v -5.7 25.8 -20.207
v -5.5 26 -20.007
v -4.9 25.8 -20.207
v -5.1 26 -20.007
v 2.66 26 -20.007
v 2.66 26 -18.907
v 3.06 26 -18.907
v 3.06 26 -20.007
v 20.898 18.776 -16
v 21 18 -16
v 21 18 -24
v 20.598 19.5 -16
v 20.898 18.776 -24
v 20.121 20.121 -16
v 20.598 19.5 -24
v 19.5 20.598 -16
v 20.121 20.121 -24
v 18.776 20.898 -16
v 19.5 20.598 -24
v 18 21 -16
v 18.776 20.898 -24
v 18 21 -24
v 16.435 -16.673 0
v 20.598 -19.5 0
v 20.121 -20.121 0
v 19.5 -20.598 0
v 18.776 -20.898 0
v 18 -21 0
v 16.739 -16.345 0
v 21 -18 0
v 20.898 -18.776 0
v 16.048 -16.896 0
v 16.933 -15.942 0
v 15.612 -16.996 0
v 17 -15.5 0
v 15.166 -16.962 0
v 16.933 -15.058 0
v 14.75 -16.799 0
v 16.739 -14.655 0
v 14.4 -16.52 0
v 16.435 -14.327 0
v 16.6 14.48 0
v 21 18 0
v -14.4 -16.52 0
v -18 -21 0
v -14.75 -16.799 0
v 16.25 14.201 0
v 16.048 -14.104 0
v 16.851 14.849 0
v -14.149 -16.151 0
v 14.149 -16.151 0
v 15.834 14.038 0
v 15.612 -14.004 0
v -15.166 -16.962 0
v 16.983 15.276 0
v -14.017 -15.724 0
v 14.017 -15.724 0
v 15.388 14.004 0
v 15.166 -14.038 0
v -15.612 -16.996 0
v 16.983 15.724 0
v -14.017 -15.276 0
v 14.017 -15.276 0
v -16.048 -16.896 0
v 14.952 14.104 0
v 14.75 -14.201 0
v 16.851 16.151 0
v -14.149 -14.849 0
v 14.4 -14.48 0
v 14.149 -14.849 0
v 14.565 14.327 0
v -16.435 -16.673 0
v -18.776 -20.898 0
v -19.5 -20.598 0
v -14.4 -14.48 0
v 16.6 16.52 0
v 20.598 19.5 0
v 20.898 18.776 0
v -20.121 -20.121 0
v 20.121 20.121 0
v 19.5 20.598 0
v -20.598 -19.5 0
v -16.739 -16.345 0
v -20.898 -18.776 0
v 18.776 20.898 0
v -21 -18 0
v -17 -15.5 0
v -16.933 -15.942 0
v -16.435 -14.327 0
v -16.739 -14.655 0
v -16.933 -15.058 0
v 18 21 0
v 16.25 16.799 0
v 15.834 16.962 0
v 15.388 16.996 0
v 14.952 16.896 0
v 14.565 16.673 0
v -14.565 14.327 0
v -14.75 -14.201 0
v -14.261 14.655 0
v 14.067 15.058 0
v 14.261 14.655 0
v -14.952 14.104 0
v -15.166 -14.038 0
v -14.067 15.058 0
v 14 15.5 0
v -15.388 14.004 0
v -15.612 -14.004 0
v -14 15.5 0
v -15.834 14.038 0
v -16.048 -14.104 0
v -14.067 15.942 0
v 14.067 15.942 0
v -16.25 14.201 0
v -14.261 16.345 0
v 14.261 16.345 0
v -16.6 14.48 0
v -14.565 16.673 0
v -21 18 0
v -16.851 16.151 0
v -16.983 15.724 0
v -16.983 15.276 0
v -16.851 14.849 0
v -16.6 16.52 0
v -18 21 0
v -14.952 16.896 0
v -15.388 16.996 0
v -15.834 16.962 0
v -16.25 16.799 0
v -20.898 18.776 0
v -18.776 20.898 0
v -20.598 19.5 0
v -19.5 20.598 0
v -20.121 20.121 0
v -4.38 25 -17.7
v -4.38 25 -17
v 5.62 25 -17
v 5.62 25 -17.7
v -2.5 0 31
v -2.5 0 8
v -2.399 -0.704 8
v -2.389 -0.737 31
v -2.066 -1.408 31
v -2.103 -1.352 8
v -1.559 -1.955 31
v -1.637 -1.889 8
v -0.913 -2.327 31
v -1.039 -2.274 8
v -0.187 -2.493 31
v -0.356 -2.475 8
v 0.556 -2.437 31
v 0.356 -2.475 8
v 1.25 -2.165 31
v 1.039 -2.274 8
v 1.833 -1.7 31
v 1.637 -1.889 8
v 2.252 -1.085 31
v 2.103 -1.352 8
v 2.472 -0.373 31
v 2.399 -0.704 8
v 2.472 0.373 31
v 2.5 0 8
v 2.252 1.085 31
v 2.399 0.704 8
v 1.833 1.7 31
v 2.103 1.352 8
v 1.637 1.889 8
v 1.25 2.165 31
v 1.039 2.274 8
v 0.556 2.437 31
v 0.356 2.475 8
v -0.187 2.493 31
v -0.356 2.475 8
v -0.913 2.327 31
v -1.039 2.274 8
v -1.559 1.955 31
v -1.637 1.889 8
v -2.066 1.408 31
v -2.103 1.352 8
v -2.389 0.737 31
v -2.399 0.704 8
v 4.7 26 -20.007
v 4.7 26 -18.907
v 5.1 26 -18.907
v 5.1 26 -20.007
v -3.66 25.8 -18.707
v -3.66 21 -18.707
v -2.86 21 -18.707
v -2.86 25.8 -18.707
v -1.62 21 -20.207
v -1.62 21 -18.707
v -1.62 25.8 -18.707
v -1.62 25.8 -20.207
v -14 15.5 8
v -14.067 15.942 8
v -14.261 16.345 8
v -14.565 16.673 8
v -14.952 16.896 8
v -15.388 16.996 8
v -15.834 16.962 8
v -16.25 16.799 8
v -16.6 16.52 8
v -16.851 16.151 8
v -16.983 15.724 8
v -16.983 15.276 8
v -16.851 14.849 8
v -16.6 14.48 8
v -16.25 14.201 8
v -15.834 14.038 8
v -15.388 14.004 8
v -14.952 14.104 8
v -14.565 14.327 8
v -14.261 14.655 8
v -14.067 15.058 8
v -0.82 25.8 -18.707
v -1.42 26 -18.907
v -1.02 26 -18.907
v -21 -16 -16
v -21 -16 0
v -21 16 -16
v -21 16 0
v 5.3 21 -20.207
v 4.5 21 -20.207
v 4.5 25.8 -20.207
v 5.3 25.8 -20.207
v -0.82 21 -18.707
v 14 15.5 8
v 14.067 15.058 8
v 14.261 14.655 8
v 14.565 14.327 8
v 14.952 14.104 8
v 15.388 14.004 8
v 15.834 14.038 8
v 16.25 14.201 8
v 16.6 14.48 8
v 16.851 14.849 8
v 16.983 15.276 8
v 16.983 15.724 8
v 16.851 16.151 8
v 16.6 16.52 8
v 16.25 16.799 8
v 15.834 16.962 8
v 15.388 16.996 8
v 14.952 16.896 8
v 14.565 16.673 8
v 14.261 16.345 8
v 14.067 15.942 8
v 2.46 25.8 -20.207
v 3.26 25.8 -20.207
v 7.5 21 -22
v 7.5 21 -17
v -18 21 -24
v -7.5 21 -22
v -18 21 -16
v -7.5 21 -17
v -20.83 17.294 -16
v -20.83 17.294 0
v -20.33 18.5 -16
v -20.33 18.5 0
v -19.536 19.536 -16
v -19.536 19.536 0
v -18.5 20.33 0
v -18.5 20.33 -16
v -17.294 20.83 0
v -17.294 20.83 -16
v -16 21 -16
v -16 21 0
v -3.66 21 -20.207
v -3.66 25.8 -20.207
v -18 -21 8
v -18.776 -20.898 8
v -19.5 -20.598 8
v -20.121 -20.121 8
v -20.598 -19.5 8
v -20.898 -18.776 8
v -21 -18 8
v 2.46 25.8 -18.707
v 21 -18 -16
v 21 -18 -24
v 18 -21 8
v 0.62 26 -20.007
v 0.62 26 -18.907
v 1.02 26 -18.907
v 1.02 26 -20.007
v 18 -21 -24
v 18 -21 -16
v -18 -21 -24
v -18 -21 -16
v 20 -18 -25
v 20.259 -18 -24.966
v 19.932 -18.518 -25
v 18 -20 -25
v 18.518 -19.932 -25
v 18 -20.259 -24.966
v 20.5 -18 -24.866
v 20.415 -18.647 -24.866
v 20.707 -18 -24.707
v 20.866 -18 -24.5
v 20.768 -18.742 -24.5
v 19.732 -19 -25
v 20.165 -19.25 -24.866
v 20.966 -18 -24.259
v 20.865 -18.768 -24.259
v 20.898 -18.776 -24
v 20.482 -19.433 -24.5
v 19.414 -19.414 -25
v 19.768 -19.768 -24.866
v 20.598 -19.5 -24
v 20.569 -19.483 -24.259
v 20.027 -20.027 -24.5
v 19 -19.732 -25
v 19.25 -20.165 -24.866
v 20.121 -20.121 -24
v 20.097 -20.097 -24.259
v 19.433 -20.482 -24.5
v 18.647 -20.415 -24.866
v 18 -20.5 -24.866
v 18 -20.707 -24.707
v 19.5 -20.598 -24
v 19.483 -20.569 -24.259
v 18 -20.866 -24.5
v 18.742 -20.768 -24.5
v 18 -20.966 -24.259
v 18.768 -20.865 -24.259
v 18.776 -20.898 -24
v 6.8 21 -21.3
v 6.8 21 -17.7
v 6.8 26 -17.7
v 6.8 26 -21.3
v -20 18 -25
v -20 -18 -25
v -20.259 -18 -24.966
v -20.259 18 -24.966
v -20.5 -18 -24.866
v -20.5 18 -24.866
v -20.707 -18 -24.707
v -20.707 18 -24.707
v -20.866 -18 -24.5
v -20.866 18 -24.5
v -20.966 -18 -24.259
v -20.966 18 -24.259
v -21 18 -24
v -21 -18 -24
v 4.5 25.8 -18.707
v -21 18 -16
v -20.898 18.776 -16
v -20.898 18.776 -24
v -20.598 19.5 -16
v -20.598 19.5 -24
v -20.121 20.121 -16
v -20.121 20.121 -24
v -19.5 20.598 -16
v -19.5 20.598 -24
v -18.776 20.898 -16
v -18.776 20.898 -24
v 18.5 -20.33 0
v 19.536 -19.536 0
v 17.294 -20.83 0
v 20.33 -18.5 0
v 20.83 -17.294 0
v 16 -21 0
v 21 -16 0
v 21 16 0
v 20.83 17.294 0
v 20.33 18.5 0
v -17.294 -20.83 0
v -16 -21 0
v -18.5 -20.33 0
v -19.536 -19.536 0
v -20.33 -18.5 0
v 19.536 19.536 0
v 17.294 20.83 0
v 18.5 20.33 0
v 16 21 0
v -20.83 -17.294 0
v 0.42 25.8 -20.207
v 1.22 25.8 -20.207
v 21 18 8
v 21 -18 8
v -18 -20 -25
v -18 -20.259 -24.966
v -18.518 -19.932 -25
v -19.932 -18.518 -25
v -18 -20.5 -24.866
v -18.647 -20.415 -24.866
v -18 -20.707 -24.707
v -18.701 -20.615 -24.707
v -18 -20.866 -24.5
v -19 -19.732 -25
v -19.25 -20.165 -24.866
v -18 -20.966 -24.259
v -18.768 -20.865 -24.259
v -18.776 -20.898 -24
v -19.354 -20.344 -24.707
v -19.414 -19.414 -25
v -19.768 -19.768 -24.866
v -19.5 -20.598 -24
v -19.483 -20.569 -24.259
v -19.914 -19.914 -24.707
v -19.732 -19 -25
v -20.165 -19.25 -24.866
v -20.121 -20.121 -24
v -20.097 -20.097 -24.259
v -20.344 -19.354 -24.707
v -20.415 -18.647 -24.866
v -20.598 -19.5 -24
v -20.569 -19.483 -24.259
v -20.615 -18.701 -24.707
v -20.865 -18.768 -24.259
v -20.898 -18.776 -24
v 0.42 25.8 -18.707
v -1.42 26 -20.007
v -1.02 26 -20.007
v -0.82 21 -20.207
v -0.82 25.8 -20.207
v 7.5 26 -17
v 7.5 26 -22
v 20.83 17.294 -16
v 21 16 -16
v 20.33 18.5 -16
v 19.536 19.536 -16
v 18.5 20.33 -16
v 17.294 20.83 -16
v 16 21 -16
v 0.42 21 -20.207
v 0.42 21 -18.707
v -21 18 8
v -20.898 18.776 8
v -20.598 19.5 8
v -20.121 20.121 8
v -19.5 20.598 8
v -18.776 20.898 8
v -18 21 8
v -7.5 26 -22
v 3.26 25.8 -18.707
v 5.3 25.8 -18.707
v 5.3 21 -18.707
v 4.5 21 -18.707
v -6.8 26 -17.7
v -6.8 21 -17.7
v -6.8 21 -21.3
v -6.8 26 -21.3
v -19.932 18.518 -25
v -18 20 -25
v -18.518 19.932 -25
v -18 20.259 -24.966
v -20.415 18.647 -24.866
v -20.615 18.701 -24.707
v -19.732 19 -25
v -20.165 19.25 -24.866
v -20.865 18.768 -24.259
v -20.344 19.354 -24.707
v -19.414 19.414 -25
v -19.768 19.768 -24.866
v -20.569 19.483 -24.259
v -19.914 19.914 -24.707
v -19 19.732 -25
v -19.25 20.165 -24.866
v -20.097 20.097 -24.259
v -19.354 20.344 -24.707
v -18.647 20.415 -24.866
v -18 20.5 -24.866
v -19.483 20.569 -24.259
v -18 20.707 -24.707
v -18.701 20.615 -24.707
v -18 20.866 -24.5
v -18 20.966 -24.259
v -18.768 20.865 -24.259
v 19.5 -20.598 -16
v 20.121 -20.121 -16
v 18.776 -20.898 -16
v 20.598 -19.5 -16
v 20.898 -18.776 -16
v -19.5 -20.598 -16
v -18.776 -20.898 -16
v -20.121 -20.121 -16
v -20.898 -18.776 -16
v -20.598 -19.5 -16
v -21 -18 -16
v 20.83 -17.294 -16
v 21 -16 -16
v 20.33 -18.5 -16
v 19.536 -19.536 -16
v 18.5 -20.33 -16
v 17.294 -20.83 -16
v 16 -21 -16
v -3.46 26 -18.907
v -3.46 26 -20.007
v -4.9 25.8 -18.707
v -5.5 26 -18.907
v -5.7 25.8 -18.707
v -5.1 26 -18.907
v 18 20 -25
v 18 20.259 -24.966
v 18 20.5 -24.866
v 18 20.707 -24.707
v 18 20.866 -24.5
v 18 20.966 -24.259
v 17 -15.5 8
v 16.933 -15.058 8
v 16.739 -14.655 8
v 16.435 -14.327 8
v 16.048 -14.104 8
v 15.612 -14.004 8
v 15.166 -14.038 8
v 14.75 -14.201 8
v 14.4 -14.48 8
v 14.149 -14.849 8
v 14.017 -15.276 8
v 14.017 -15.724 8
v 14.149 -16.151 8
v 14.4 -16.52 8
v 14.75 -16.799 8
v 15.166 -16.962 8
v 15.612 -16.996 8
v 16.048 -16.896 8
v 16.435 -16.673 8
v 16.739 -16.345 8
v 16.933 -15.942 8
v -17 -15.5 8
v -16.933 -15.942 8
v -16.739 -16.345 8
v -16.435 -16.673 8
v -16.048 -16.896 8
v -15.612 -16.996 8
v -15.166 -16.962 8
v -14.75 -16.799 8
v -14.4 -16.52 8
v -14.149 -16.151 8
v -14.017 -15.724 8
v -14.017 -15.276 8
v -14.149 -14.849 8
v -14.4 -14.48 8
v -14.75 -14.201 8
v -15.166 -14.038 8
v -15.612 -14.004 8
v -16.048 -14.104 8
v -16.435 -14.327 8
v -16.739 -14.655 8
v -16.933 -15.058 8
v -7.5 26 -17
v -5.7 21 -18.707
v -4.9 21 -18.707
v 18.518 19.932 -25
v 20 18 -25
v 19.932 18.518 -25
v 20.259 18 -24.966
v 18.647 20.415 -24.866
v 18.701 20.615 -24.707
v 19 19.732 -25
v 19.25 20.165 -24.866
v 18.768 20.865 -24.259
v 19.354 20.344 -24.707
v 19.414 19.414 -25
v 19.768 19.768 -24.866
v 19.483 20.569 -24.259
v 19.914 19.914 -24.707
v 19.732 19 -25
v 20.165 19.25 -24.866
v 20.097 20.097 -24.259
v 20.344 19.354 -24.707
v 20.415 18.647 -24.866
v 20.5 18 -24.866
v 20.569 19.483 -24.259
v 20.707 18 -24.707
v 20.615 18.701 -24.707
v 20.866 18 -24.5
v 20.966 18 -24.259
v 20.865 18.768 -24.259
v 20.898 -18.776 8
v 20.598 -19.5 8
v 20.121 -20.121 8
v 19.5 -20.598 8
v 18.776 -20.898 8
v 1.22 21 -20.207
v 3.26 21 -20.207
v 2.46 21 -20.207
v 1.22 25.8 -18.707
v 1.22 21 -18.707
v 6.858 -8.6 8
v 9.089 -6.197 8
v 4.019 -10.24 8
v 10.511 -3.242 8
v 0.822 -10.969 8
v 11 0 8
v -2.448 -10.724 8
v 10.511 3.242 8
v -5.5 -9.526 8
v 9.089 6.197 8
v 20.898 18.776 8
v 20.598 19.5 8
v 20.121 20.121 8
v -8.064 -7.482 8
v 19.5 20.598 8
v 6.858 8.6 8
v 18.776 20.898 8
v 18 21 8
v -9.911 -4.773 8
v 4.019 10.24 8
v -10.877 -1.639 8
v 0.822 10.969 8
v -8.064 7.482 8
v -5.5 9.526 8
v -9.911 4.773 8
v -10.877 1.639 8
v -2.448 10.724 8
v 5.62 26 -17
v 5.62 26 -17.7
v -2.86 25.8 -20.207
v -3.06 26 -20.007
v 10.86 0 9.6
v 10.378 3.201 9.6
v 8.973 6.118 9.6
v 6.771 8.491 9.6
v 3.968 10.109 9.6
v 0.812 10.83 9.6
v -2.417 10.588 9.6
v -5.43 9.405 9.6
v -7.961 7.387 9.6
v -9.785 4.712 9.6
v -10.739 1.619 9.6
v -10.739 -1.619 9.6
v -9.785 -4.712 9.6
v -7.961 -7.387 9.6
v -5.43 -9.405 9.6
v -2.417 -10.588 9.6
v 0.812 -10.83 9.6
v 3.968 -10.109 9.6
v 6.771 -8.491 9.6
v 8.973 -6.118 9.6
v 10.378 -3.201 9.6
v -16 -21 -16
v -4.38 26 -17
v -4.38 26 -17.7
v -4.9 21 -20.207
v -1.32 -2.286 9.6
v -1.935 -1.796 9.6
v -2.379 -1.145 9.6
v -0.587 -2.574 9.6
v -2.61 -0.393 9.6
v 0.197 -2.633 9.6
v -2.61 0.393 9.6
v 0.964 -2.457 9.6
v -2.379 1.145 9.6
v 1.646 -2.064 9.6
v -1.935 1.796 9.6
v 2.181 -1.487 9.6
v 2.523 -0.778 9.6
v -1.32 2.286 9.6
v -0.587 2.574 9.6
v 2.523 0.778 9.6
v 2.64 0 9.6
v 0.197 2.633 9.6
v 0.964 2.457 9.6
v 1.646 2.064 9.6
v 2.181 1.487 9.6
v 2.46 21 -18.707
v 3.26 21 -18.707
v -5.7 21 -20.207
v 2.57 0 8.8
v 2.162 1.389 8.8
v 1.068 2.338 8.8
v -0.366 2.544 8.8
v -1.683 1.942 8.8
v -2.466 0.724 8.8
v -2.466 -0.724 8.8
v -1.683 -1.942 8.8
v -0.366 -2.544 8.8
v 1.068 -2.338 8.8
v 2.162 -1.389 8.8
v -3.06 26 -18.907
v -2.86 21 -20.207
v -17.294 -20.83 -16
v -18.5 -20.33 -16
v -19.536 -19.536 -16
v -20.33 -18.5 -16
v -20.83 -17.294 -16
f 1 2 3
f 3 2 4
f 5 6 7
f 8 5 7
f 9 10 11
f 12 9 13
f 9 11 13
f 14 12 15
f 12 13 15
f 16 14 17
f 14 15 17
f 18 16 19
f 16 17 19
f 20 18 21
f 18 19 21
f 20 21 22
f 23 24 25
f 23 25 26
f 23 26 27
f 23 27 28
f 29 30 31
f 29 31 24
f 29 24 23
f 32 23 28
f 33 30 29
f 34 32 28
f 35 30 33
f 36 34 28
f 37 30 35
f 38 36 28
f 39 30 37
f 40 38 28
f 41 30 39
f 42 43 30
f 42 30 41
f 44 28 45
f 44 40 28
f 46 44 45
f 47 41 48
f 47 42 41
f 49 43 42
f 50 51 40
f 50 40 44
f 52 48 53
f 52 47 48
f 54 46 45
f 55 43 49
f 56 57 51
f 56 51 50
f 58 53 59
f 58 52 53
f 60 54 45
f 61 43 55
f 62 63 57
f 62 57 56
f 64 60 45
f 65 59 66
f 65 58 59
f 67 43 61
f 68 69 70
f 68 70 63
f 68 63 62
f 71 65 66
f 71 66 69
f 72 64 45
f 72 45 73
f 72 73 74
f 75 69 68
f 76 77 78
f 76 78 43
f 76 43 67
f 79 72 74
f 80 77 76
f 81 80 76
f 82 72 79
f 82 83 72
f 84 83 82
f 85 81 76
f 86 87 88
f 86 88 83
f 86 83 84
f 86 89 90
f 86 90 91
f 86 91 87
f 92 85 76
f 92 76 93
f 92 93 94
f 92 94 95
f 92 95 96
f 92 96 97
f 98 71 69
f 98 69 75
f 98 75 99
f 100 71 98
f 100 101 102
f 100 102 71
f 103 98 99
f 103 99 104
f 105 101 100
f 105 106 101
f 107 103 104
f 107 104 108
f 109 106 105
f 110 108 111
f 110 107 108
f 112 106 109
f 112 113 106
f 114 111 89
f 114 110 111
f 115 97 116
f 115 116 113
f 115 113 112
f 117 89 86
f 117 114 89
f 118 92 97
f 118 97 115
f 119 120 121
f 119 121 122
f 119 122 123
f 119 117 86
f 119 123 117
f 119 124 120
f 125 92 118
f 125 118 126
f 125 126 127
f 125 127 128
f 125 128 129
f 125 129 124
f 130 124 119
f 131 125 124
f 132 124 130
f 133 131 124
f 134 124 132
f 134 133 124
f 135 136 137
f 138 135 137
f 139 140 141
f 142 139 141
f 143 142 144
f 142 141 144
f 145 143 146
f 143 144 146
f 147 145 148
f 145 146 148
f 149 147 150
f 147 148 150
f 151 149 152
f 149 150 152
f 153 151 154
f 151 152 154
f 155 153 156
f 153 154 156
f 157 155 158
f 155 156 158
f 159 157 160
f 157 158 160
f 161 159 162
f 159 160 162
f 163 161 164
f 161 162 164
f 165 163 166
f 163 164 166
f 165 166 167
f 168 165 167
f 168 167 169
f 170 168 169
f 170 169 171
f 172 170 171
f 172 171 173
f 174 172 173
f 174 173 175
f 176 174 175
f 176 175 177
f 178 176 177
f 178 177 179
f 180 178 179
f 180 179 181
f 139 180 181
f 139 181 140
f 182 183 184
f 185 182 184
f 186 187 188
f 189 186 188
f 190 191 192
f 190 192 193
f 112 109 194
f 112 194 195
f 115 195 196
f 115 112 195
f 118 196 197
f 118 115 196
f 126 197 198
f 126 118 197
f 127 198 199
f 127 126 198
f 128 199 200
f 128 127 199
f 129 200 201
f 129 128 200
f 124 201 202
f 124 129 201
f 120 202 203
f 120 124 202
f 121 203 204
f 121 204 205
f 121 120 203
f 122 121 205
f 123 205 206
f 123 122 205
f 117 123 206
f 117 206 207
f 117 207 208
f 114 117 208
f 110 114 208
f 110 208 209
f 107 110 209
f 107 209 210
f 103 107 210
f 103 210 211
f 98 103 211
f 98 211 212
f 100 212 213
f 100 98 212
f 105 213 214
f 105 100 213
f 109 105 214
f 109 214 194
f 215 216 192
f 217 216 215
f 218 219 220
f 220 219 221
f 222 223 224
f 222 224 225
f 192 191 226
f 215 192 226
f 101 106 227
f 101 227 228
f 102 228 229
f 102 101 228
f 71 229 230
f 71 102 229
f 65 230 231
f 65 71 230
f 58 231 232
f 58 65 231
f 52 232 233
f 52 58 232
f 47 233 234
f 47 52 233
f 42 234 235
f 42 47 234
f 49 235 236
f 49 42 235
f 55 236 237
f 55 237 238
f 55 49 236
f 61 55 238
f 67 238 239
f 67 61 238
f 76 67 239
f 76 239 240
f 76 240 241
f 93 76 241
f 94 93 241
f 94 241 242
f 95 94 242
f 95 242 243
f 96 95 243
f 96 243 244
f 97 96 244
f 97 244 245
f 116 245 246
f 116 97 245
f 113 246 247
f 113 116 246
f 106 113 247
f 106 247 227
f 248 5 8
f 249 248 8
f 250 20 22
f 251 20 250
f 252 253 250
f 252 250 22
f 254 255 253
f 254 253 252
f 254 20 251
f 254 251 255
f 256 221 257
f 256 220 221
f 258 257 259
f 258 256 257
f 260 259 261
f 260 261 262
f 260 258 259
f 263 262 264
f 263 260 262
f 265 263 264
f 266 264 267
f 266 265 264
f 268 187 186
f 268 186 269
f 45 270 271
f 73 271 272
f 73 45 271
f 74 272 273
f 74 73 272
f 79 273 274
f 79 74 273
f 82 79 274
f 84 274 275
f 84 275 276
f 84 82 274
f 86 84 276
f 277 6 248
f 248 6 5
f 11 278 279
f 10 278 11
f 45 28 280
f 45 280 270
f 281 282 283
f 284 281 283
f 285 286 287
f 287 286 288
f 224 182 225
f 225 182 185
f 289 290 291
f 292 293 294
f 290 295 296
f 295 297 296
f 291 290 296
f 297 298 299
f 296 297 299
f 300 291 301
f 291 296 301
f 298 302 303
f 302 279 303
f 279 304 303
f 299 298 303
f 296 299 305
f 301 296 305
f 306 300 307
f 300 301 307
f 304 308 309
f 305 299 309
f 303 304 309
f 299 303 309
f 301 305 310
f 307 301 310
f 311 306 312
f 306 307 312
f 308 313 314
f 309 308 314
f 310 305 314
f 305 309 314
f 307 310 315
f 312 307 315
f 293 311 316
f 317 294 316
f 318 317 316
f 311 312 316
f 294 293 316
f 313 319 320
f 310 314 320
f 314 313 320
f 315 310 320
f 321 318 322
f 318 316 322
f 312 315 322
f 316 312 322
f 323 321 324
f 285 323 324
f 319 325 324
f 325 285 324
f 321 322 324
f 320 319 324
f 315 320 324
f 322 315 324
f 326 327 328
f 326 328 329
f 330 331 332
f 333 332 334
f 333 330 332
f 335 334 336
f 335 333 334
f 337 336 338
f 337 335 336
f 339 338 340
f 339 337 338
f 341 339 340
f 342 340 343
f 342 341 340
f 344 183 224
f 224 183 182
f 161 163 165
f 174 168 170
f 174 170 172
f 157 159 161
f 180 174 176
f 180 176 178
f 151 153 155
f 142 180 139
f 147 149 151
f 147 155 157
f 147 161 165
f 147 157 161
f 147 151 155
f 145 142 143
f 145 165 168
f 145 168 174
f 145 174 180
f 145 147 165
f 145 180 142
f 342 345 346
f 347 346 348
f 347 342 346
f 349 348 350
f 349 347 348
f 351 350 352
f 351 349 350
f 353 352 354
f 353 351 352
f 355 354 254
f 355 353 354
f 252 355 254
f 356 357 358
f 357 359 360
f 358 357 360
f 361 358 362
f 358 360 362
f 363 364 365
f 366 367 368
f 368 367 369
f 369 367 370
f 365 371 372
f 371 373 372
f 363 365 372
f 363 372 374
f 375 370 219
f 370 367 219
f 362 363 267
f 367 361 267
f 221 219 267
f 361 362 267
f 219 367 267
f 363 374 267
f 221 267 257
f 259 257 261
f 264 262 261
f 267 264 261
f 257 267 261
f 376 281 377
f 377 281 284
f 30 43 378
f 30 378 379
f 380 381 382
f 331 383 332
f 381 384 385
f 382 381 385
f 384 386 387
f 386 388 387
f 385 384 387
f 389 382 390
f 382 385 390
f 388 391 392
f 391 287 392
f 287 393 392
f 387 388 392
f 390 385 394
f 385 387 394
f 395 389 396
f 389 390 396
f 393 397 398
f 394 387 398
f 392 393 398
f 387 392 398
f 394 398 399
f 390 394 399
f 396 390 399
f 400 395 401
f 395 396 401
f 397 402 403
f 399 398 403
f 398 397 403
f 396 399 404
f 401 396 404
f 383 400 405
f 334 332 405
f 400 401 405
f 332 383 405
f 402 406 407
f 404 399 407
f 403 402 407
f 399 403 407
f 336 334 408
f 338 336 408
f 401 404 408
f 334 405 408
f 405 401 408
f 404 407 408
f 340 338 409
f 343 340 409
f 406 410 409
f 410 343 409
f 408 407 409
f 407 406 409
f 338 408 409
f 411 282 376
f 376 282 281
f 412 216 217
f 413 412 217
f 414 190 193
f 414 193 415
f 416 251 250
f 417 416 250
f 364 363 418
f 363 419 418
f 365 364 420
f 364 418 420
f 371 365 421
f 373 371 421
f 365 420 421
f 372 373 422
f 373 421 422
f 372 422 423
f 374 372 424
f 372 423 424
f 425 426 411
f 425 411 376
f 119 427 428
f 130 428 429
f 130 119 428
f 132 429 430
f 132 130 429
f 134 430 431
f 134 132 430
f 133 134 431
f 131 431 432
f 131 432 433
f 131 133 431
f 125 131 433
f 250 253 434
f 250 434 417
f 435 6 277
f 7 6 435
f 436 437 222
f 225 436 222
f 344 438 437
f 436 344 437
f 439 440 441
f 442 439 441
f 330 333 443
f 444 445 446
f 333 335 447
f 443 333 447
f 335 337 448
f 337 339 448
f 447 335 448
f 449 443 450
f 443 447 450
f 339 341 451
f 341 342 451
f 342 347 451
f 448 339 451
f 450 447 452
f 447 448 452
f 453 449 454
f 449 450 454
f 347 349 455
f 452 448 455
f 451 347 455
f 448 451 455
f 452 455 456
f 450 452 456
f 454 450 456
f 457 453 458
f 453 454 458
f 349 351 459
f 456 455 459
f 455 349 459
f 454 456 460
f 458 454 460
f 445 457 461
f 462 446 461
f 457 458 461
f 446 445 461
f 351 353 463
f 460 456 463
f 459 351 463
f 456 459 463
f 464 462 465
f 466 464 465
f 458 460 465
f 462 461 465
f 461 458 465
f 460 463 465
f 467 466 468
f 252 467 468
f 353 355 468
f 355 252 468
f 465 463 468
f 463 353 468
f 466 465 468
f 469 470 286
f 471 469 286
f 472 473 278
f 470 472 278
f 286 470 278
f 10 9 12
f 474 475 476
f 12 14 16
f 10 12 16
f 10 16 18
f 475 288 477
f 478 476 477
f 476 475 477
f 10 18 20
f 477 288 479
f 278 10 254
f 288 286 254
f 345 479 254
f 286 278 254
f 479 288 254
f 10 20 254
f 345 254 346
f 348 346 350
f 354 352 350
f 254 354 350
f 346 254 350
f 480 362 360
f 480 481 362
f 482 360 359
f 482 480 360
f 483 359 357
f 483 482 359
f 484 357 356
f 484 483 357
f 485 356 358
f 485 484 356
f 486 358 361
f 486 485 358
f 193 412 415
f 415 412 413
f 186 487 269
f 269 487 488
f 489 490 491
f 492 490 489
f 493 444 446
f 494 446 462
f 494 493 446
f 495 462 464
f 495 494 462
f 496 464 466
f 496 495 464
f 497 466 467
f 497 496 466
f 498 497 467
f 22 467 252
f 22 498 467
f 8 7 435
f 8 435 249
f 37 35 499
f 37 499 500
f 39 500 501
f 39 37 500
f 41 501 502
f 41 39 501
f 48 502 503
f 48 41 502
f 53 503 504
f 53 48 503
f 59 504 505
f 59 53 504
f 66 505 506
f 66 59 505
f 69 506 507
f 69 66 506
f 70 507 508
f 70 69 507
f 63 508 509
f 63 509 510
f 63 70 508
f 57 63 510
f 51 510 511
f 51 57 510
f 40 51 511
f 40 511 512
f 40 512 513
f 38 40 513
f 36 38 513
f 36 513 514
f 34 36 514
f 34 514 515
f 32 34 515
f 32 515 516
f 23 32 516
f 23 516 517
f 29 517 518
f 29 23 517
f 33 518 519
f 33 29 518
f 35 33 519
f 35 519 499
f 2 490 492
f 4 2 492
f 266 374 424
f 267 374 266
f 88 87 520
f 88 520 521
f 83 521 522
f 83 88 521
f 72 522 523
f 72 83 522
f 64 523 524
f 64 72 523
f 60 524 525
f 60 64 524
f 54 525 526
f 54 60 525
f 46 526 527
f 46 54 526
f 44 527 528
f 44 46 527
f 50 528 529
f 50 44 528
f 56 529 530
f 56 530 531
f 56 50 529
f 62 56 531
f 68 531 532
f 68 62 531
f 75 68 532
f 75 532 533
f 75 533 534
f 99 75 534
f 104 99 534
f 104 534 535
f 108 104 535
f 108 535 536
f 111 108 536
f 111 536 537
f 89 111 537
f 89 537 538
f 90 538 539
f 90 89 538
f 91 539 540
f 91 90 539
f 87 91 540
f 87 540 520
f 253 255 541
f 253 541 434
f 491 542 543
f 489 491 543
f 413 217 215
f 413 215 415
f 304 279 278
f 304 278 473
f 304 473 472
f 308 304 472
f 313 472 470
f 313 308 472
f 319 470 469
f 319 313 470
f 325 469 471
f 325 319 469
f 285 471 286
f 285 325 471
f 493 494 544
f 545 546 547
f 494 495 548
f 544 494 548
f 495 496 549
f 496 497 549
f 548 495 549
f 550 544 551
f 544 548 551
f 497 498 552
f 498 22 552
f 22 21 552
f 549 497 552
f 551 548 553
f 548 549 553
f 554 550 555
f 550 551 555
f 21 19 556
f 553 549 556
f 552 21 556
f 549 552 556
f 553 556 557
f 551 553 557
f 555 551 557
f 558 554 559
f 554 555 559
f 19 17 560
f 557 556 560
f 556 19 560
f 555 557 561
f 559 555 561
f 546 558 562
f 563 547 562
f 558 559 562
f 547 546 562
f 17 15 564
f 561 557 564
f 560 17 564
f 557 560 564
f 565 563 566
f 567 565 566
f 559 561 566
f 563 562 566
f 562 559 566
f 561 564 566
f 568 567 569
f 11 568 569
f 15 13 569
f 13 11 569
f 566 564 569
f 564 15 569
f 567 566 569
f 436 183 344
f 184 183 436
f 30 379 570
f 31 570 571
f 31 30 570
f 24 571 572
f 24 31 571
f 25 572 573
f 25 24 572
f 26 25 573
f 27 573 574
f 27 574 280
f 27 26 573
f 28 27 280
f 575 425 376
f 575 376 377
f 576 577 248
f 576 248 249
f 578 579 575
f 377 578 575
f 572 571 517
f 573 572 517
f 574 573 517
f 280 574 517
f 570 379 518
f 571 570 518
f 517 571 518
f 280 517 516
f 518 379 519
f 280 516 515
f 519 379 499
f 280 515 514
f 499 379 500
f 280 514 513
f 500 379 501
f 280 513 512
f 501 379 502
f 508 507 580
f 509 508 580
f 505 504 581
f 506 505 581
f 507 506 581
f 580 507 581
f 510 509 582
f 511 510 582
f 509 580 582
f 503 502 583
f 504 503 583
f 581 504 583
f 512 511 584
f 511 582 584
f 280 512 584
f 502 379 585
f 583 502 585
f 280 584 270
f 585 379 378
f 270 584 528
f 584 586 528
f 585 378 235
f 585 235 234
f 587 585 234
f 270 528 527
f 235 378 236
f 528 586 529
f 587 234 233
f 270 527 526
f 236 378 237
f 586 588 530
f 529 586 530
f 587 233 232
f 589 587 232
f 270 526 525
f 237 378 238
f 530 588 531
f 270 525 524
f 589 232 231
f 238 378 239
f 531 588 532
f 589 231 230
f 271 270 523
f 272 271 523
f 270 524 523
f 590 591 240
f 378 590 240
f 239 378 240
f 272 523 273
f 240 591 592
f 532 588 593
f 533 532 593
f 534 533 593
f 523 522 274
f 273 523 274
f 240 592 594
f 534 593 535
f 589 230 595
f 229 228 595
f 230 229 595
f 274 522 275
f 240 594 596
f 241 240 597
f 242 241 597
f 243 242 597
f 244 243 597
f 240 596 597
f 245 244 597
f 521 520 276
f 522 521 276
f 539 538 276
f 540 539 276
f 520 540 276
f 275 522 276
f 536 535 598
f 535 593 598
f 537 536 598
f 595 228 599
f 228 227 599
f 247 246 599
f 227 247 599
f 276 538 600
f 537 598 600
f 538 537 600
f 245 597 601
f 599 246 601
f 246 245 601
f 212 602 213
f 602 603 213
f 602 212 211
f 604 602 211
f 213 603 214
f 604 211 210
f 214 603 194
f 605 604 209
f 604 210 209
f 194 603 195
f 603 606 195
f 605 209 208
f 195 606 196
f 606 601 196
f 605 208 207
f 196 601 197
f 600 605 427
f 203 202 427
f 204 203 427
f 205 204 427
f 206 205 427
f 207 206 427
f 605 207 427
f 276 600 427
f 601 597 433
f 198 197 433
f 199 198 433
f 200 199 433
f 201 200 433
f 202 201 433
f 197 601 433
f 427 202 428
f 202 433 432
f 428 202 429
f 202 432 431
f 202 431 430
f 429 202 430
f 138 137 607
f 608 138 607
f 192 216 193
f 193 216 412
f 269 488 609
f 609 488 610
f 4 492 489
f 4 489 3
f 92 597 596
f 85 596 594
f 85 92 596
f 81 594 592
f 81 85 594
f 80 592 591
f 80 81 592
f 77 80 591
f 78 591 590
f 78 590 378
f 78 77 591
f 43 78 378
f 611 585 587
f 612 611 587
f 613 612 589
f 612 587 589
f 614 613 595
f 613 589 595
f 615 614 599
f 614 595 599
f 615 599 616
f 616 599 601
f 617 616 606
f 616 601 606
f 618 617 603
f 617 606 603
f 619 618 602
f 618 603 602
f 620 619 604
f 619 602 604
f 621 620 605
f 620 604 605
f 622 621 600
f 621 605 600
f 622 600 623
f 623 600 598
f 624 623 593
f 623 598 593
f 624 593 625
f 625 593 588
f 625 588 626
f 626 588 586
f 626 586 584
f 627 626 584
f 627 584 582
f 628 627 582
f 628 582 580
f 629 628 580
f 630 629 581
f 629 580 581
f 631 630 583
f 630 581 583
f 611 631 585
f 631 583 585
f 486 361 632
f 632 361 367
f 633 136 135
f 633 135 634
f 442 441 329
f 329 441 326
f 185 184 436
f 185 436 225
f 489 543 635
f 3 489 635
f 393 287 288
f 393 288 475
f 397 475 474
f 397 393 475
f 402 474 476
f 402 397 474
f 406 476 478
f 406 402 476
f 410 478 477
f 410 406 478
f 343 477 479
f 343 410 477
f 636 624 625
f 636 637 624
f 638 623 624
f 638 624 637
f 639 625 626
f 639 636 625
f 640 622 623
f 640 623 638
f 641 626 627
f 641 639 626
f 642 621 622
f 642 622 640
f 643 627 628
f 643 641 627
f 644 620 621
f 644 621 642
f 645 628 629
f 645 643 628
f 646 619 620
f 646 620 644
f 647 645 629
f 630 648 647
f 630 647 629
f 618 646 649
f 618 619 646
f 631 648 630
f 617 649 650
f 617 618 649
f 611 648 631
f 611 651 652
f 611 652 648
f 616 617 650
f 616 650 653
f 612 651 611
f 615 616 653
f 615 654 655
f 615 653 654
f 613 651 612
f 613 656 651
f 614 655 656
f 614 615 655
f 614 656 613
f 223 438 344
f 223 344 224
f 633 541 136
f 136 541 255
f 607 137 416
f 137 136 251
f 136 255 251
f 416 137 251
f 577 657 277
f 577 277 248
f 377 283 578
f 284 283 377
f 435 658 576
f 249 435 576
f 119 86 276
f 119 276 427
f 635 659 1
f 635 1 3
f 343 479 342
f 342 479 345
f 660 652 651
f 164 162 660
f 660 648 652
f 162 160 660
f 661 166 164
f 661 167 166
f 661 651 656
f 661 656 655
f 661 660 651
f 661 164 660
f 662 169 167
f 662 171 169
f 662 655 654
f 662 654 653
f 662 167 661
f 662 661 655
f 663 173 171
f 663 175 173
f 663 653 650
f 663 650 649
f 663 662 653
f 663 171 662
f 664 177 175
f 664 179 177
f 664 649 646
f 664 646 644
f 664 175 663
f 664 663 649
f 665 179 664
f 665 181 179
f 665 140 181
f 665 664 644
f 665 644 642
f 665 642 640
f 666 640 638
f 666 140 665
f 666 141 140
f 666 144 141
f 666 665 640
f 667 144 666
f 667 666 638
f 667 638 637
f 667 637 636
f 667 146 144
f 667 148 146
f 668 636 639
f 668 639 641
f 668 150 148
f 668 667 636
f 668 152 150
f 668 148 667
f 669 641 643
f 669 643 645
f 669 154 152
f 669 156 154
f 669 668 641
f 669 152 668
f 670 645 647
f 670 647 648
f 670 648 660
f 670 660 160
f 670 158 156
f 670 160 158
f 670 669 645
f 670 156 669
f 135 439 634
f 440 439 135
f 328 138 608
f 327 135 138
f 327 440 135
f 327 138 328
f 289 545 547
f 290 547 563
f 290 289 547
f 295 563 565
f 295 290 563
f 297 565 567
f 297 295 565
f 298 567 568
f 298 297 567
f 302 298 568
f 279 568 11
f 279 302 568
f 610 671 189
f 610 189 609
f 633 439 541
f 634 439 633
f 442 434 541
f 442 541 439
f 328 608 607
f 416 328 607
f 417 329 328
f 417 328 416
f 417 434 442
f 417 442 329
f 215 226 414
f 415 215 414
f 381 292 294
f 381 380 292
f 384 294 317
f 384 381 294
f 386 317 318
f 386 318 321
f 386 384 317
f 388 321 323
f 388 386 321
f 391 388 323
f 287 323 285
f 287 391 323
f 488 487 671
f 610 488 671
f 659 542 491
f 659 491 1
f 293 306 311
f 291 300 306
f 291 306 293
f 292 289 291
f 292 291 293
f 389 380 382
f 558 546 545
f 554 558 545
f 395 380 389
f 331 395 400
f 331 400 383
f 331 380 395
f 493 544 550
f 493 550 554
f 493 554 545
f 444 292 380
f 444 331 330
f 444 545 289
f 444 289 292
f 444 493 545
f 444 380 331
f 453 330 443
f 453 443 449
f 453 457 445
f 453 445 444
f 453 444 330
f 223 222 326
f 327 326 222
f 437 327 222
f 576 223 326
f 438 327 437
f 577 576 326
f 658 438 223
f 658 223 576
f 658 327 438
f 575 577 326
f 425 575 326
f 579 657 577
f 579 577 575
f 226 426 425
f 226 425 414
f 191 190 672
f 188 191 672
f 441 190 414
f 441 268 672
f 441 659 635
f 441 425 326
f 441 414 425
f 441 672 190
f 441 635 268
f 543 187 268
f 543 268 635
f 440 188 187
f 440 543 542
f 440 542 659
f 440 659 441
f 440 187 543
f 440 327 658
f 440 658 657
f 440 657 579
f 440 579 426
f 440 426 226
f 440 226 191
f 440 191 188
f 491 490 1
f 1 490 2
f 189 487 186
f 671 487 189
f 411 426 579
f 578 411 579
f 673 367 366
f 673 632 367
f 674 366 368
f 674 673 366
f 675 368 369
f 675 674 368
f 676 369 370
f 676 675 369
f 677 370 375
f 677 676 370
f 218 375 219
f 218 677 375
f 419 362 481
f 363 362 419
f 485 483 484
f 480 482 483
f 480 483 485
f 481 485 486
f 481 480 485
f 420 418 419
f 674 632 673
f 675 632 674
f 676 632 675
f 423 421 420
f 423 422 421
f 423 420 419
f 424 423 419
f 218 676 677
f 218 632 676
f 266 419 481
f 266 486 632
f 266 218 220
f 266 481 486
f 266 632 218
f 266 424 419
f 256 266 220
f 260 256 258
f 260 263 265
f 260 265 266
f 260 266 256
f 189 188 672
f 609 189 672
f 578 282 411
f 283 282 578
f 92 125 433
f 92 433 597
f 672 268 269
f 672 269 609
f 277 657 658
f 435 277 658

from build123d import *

# Parameters (mm, degrees)
SKETCH_1_R          = 1.5
EXTRUDE_1_DEPTH     = 8
SKETCH_4_R          = 2.5
EXTRUDE_2_DEPTH     = 23
SKETCH_9_W          = 42
SKETCH_9_H          = 42
EXTRUDE_7_DEPTH     = 16
SKETCH_10_W         = 42
SKETCH_10_H         = 42
EXTRUDE_8_DEPTH     = 9
FILLET_1_R          = 3
FILLET_2_R          = 5
SKETCH_14_W         = 15
SKETCH_14_H         = 5
SKETCH_14_W_2       = 13.6
SKETCH_14_H_2       = 3.6
SKETCH_14_W_3       = 0.8
SKETCH_14_H_3       = 1.5
EXTRUDE_10_DEPTH    = 5
CHAMFER_1_SIZE      = 0.2
SKETCH_15_W         = 10
SKETCH_15_H         = 1
CUT_EXTRUDE_2_DEPTH = 0.7
FILLET_3_R          = 1
SKETCH_16_R         = 11
SKETCH_16_R_2       = 2.5
EXTRUDE_11_DEPTH    = 1.6
EXTRUDE_11_DRAFT    = 5


with BuildPart() as part:
    # 草图1 → 凸台-拉伸1 (new body)
    with BuildSketch(Plane.XY):
        with BuildLine():
            Line((-18, 21), (18, 21))
            ThreePointArc((18, 21), (20.121320344, 20.121320344), (21, 18))
            Line((21, 18), (21, -18))
            ThreePointArc((21, -18), (20.121320344, -20.121320344), (18, -21))
            Line((18, -21), (-18, -21))
            ThreePointArc((-18, -21), (-20.121320344, -20.121320344), (-21, -18))
            Line((-21, -18), (-21, 18))
            ThreePointArc((-21, 18), (-20.121320344, 20.121320344), (-18, 21))
        make_face()
        with Locations((-15.5, 15.5)):
            Circle(SKETCH_1_R, mode=Mode.SUBTRACT)
        with Locations(Location((15.5, 15.5, 0), (0, 0, 180))):
            Circle(SKETCH_1_R, mode=Mode.SUBTRACT)
        with Locations((15.5, -15.5)):
            Circle(SKETCH_1_R, mode=Mode.SUBTRACT)
        with Locations(Location((-15.5, -15.5, 0), (0, 0, 180))):
            Circle(SKETCH_1_R, mode=Mode.SUBTRACT)
    extrude(amount=EXTRUDE_1_DEPTH)

    # 草图4 → 凸台-拉伸2 (add)
    with BuildSketch(Plane.XY.offset(8)):
        with Locations(Location((0, 0, 0), (0, 0, 180))):
            Circle(SKETCH_4_R)
    extrude(amount=EXTRUDE_2_DEPTH)


with BuildPart() as body_2:
    # 草图9 → 凸台-拉伸7 (new body)
    with BuildSketch(Plane(origin=(0, 0, 0), x_dir=(-1, 0, 0), z_dir=(0, 0, -1))):
        Rectangle(SKETCH_9_W, SKETCH_9_H)
    extrude(amount=EXTRUDE_7_DEPTH)

    # 圆角2
    fillet_2_edges = [body_2.edges().sort_by_distance(p)[0] for p in [
        (-21, -21, -8),
        (21, -21, -8),
        (21, 21, -8),
        (-21, 21, -8),
    ]]
    fillet(fillet_2_edges, radius=FILLET_2_R)


with BuildPart() as body_3:
    # 草图10 → 凸台-拉伸8 (new body)
    with BuildSketch(Plane(origin=(0, 0, -16), x_dir=(-1, 0, 0), z_dir=(0, 0, -1))):
        Rectangle(SKETCH_10_W, SKETCH_10_H)
    extrude(amount=EXTRUDE_8_DEPTH)

    # 圆角1
    fillet_1_edges = [body_3.edges().sort_by_distance(p)[0] for p in [
        (21, 21, -20.5),
        (-21, 21, -20.5),
        (-21, -21, -20.5),
        (21, -21, -20.5),
    ]]
    fillet(fillet_1_edges, radius=FILLET_1_R)

    # 草图14 → 凸台-拉伸10 (add)
    # profile 1 of 7: a face of its own
    with BuildSketch(Plane(origin=(0, 21, 0), x_dir=(1, 0, 0), z_dir=(0, 1, 0))):
        with Locations((0, 19.5)):
            Rectangle(SKETCH_14_W, SKETCH_14_H)
        with Locations((0, 19.5)):
            Rectangle(SKETCH_14_W_2, SKETCH_14_H_2, mode=Mode.SUBTRACT)
    # profile 2 of 7: a face of its own
    with BuildSketch(Plane(origin=(0, 21, 0), x_dir=(1, 0, 0), z_dir=(0, 1, 0))):
        with Locations((-5.3, 19.457329348)):
            Rectangle(SKETCH_14_W_3, SKETCH_14_H_3)
    # profile 3 of 7: a face of its own
    with BuildSketch(Plane(origin=(0, 21, 0), x_dir=(1, 0, 0), z_dir=(0, 1, 0))):
        with Locations((-1.22, 19.457329348)):
            Rectangle(SKETCH_14_W_3, SKETCH_14_H_3)
    # profile 4 of 7: a face of its own
    with BuildSketch(Plane(origin=(0, 21, 0), x_dir=(1, 0, 0), z_dir=(0, 1, 0))):
        with Locations((4.9, 19.457329348)):
            Rectangle(SKETCH_14_W_3, SKETCH_14_H_3)
    # profile 5 of 7: a face of its own
    with BuildSketch(Plane(origin=(0, 21, 0), x_dir=(1, 0, 0), z_dir=(0, 1, 0))):
        with Locations((2.86, 19.457329348)):
            Rectangle(SKETCH_14_W_3, SKETCH_14_H_3)
    # profile 6 of 7: a face of its own
    with BuildSketch(Plane(origin=(0, 21, 0), x_dir=(1, 0, 0), z_dir=(0, 1, 0))):
        with Locations((-3.26, 19.457329348)):
            Rectangle(SKETCH_14_W_3, SKETCH_14_H_3)
    # profile 7 of 7: a face of its own
    with BuildSketch(Plane(origin=(0, 21, 0), x_dir=(1, 0, 0), z_dir=(0, 1, 0))):
        with Locations((0.82, 19.457329348)):
            Rectangle(SKETCH_14_W_3, SKETCH_14_H_3)
    extrude(amount=EXTRUDE_10_DEPTH)

    # 倒角1
    chamfer_1_edges = [body_3.edges().sort_by_distance(p)[0] for p in [
        (-2.86, 26, -19.457329348),
        (-3.26, 26, -20.207329348),
        (-3.66, 26, -19.457329348),
        (-3.26, 26, -18.707329348),
        (1.22, 26, -19.457329348),
        (0.82, 26, -20.207329348),
        (0.42, 26, -19.457329348),
        (0.82, 26, -18.707329348),
        (-4.9, 26, -19.457329348),
        (-5.3, 26, -20.207329348),
        (-5.7, 26, -19.457329348),
        (-5.3, 26, -18.707329348),
        (-0.82, 26, -19.457329348),
        (-1.22, 26, -20.207329348),
        (-1.62, 26, -19.457329348),
        (-1.22, 26, -18.707329348),
        (5.3, 26, -19.457329348),
        (4.9, 26, -20.207329348),
        (4.5, 26, -19.457329348),
        (4.9, 26, -18.707329348),
        (3.26, 26, -19.457329348),
        (2.86, 26, -20.207329348),
        (2.46, 26, -19.457329348),
        (2.86, 26, -18.707329348),
    ]]
    chamfer(chamfer_1_edges, length=CHAMFER_1_SIZE)

    # 草图15 → 切除-拉伸2 (cut)
    with BuildSketch(Plane.XY.offset(-17)):
        with Locations((0.62, 25.5)):
            Rectangle(SKETCH_15_W, SKETCH_15_H)
    extrude(amount=-CUT_EXTRUDE_2_DEPTH, mode=Mode.SUBTRACT)

    # 圆角3
    fillet_3_edges = [body_3.edges().sort_by_distance(p)[0] for p in [
        (0, -21, -25),
        (21, 0, -25),
        (-21, 0, -25),
        (0, 21, -25),
        (20.121320344, 20.121320344, -25),
        (-20.121320344, 20.121320344, -25),
        (-20.121320344, -20.121320344, -25),
        (20.121320344, -20.121320344, -25),
    ]]
    fillet(fillet_3_edges, radius=FILLET_3_R)


with BuildPart() as extrude_11_tool:
    # 草图16 → 凸台-拉伸11 (with draft: the straight prism first)
    with BuildSketch(Plane.XY.offset(8)):
        Circle(SKETCH_16_R)
        Circle(SKETCH_16_R_2, mode=Mode.SUBTRACT)
    extrude(amount=EXTRUDE_11_DEPTH)
    # 凸台-拉伸11: the draft: its side faces are tilted about the plane it starts from
    extrude_11_sides = [extrude_11_tool.faces().sort_by_distance(p)[0] for p in [
        (-11, 0, 8.8),
        (-2.5, 0, 8.8),
    ]]
    draft(extrude_11_sides, Plane.XY.offset(8), EXTRUDE_11_DRAFT)


with BuildPart() as part_1:
    add(part.part)

    # 凸台-拉伸11: add extrude_11_tool
    add(extrude_11_tool.part)


solid = Compound([body_2.part, body_3.part, part_1.part])
